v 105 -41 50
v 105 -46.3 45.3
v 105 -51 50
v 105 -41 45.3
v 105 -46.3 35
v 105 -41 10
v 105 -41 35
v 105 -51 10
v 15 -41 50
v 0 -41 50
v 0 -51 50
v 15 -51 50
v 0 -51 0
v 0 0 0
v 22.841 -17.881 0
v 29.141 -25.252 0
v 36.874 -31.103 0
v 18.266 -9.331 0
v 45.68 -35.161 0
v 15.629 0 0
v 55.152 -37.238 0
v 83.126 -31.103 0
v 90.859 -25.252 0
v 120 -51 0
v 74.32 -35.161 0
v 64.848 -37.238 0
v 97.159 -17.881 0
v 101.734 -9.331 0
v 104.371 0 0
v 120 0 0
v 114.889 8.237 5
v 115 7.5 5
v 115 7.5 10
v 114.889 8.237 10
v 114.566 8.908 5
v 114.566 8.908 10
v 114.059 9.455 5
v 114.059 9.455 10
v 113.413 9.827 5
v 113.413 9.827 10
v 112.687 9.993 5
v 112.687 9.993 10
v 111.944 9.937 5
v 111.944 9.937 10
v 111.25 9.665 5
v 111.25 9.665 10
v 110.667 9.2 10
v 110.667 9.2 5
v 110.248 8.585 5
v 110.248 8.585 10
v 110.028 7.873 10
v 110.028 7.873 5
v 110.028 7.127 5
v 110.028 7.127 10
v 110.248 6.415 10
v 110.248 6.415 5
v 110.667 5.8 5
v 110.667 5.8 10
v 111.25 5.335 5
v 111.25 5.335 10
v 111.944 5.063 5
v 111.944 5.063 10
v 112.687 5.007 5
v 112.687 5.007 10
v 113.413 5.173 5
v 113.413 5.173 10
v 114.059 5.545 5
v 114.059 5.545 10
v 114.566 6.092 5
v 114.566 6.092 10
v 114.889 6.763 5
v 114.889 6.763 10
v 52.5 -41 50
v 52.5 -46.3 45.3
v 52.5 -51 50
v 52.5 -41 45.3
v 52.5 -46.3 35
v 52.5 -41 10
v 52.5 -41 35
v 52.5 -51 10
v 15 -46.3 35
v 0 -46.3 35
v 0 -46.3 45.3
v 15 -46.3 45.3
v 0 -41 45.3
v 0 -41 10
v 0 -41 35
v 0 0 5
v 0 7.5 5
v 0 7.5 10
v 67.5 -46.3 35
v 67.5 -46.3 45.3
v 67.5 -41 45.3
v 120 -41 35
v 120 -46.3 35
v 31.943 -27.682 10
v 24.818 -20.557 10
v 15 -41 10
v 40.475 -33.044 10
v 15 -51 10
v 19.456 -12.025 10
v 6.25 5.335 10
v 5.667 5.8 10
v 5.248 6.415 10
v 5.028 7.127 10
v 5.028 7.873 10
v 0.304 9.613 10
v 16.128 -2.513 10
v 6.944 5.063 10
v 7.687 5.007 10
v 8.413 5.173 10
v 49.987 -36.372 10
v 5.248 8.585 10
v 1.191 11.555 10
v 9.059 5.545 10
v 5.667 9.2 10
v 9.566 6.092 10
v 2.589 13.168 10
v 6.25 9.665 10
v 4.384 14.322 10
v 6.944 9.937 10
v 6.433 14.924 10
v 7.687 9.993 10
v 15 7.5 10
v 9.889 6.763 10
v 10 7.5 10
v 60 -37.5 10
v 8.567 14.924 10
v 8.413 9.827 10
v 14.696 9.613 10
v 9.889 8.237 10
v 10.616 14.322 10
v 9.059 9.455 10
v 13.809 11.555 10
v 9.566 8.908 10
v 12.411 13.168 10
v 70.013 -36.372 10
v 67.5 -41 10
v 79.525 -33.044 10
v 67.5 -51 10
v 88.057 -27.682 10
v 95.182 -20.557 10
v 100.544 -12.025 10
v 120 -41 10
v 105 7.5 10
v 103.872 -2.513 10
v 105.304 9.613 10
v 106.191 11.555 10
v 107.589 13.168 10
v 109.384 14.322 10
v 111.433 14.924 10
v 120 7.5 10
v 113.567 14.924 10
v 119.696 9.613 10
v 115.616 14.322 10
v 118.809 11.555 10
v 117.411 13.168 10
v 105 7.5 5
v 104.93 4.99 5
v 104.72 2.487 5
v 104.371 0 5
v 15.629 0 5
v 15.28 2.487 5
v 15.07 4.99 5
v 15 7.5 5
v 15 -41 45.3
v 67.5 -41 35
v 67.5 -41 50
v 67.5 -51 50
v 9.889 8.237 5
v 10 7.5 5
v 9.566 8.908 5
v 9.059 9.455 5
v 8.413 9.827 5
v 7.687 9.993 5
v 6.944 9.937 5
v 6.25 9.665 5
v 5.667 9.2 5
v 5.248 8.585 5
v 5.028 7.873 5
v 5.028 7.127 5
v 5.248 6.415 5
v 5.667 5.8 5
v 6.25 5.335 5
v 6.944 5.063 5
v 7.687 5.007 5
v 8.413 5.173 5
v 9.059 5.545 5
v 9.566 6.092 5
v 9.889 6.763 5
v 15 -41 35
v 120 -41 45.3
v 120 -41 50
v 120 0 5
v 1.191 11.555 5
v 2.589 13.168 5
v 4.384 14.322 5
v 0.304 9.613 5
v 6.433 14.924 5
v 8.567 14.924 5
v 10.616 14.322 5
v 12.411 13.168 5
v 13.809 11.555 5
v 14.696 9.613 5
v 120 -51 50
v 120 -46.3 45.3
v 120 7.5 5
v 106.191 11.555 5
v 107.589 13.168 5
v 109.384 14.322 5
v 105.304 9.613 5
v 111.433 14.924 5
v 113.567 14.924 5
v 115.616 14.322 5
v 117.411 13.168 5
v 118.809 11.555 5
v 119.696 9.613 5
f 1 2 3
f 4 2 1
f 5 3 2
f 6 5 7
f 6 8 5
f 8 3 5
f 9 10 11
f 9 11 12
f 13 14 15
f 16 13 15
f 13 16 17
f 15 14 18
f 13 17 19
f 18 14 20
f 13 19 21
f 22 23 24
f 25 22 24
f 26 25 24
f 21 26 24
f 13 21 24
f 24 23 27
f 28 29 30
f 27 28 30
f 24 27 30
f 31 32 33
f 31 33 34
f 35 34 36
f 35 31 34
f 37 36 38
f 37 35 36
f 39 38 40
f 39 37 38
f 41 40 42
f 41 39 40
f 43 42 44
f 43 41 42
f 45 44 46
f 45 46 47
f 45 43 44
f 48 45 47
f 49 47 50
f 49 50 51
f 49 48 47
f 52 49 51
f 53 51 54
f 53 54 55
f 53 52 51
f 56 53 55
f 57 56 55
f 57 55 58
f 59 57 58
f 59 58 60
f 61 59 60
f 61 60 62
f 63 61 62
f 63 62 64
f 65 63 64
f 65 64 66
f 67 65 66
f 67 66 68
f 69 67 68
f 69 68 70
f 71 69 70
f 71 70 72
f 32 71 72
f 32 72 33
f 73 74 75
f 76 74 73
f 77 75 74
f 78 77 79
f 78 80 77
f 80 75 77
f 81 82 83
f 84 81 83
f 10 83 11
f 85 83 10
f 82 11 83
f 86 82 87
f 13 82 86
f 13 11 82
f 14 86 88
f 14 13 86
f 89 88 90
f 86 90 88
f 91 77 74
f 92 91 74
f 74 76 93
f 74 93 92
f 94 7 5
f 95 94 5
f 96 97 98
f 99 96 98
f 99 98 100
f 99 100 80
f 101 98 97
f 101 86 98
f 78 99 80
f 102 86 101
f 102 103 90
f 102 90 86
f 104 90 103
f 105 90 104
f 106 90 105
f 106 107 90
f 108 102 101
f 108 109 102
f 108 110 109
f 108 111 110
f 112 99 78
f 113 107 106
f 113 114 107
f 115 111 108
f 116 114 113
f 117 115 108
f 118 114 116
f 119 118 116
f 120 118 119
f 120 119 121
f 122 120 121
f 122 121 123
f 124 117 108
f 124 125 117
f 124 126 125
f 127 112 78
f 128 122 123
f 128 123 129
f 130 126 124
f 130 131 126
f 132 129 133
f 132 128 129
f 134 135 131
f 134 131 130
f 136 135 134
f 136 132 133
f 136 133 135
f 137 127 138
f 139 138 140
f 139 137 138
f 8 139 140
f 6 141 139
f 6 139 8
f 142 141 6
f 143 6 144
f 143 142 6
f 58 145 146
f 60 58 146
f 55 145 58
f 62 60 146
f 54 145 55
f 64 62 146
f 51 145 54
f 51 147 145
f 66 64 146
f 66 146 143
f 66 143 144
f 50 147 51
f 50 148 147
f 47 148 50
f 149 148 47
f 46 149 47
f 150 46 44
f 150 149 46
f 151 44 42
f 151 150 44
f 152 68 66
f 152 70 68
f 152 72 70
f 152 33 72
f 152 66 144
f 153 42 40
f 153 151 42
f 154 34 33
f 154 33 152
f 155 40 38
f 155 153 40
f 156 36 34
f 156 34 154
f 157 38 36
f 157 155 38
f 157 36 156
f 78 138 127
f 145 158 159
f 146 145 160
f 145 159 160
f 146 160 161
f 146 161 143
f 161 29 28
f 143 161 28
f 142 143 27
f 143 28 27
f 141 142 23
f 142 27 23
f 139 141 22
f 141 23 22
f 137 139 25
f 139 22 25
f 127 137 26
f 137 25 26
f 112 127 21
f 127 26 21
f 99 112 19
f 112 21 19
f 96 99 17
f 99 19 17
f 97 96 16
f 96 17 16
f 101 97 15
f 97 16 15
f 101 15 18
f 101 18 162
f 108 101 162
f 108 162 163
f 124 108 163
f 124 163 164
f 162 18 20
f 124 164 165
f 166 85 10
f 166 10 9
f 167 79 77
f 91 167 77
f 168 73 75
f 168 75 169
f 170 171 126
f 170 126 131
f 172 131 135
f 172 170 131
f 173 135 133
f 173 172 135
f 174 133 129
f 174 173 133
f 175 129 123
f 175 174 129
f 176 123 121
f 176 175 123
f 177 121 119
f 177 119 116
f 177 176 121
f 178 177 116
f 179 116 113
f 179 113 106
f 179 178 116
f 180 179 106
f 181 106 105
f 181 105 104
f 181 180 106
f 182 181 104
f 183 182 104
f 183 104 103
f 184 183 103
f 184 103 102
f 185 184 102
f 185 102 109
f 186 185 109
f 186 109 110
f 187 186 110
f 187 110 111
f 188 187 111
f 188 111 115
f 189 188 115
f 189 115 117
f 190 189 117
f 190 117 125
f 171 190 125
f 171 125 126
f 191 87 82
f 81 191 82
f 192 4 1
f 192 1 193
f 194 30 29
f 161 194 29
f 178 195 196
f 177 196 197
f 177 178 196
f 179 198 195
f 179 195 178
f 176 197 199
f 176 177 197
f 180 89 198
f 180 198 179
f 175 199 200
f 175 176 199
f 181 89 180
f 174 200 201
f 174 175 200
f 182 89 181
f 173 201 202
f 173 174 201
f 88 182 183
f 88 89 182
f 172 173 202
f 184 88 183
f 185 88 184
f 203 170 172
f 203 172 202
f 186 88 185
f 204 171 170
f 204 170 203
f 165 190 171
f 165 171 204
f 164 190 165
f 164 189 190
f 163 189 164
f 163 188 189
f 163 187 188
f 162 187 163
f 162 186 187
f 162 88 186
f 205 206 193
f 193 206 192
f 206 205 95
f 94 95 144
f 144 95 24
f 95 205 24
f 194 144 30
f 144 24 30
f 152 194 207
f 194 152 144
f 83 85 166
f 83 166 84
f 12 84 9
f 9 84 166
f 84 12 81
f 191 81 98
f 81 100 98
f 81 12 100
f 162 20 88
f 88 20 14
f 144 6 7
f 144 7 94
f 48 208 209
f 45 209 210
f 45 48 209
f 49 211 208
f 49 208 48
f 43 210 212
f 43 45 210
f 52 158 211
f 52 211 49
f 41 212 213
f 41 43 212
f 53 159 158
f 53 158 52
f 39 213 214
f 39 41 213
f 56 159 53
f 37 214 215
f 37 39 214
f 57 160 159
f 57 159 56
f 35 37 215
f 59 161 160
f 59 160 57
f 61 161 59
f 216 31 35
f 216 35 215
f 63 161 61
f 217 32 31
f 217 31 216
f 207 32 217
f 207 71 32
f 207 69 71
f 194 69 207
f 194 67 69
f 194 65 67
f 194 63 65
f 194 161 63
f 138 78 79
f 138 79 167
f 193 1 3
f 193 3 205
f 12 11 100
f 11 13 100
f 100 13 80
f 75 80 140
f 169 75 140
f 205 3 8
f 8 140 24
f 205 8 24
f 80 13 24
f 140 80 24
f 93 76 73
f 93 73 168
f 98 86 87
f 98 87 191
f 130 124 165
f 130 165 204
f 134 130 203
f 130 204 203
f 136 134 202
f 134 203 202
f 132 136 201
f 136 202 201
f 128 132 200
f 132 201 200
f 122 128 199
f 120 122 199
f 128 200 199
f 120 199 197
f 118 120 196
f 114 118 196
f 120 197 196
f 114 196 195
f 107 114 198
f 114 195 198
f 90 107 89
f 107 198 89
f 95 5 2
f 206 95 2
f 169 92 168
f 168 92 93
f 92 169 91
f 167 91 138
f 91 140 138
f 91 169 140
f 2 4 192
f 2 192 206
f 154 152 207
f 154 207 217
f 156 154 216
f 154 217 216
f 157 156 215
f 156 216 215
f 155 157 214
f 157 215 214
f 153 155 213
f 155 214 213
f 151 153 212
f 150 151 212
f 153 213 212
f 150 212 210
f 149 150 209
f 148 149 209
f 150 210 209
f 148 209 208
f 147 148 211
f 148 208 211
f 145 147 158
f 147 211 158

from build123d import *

# Parameters (mm, degrees)
F0_R     = 2.5
F1_DEPTH = 10
F3_DEPTH = 5
F4_W     = 15
F4_H     = 10
F5_DEPTH = 40
F6_W     = 5.3
F6_H     = 10.3
F7_DEPTH = 120.001


with BuildPart() as f1:
    # F0 (on Top) → F1 (new body)
    with BuildSketch(Plane.XY):
        with BuildLine():
            ThreePointArc((105, 7.5), (60, -37.5), (15, 7.5))
            ThreePointArc((15, 7.5), (7.5, 15), (0, 7.5))
            Line((0, 7.5), (0, -51))
            Line((0, -51), (120, -51))
            Line((120, -51), (120, 7.5))
            ThreePointArc((120, 7.5), (112.5, 15), (105, 7.5))
        make_face()
        with Locations((7.5, 7.5)):
            Circle(F0_R, mode=Mode.SUBTRACT)
        with Locations((112.5, 7.5)):
            Circle(F0_R, mode=Mode.SUBTRACT)
    extrude(amount=F1_DEPTH)

    # F2 (on face) → F3 (cut)
    with BuildSketch(Plane(origin=(0, 0, 0), x_dir=(1, 0, 0), z_dir=(0, 0, -1))):
        with BuildLine():
            ThreePointArc((0, -7.5), (7.5, -15), (15, -7.5))
            ThreePointArc((15, -7.5), (15.157626, -3.736818), (15.629402, 0))
            Line((15.629402, 0), (0, 0))
            Line((0, 0), (0, -7.5))
        make_face()
        with BuildLine():
            ThreePointArc((15.629402, 0), (15.157626, -3.736818), (15, -7.5))
            ThreePointArc((15, -7.5), (60, -52.5), (105, -7.5))
            ThreePointArc((105, -7.5), (112.5, -15), (120, -7.5))
            Line((120, -7.5), (120, 0))
            Line((120, 0), (104.370598, 0))
            ThreePointArc((104.370598, 0), (60, 37.5), (15.629402, 0))
        make_face()
    extrude(amount=-F3_DEPTH, mode=Mode.SUBTRACT)

    # F4 (on face) → F5 (join)
    with BuildSketch(Plane.XY.offset(10)):
        with Locations((7.5, -46)):
            Rectangle(F4_W, F4_H)
        with Locations((112.5, -46)):
            Rectangle(F4_W, F4_H)
        with Locations((60, -46)):
            Rectangle(F4_W, F4_H)
    extrude(amount=F5_DEPTH)

    # F6 (on face) → F7 (cut, through all)
    with BuildSketch(Plane(origin=(0, 0, 0), x_dir=(0, -1, 0), z_dir=(-1, 0, 0))):
        with Locations((43.65, 40.15)):
            Rectangle(F6_W, F6_H)
    extrude(amount=-F7_DEPTH, mode=Mode.SUBTRACT)


solid = f1.part
